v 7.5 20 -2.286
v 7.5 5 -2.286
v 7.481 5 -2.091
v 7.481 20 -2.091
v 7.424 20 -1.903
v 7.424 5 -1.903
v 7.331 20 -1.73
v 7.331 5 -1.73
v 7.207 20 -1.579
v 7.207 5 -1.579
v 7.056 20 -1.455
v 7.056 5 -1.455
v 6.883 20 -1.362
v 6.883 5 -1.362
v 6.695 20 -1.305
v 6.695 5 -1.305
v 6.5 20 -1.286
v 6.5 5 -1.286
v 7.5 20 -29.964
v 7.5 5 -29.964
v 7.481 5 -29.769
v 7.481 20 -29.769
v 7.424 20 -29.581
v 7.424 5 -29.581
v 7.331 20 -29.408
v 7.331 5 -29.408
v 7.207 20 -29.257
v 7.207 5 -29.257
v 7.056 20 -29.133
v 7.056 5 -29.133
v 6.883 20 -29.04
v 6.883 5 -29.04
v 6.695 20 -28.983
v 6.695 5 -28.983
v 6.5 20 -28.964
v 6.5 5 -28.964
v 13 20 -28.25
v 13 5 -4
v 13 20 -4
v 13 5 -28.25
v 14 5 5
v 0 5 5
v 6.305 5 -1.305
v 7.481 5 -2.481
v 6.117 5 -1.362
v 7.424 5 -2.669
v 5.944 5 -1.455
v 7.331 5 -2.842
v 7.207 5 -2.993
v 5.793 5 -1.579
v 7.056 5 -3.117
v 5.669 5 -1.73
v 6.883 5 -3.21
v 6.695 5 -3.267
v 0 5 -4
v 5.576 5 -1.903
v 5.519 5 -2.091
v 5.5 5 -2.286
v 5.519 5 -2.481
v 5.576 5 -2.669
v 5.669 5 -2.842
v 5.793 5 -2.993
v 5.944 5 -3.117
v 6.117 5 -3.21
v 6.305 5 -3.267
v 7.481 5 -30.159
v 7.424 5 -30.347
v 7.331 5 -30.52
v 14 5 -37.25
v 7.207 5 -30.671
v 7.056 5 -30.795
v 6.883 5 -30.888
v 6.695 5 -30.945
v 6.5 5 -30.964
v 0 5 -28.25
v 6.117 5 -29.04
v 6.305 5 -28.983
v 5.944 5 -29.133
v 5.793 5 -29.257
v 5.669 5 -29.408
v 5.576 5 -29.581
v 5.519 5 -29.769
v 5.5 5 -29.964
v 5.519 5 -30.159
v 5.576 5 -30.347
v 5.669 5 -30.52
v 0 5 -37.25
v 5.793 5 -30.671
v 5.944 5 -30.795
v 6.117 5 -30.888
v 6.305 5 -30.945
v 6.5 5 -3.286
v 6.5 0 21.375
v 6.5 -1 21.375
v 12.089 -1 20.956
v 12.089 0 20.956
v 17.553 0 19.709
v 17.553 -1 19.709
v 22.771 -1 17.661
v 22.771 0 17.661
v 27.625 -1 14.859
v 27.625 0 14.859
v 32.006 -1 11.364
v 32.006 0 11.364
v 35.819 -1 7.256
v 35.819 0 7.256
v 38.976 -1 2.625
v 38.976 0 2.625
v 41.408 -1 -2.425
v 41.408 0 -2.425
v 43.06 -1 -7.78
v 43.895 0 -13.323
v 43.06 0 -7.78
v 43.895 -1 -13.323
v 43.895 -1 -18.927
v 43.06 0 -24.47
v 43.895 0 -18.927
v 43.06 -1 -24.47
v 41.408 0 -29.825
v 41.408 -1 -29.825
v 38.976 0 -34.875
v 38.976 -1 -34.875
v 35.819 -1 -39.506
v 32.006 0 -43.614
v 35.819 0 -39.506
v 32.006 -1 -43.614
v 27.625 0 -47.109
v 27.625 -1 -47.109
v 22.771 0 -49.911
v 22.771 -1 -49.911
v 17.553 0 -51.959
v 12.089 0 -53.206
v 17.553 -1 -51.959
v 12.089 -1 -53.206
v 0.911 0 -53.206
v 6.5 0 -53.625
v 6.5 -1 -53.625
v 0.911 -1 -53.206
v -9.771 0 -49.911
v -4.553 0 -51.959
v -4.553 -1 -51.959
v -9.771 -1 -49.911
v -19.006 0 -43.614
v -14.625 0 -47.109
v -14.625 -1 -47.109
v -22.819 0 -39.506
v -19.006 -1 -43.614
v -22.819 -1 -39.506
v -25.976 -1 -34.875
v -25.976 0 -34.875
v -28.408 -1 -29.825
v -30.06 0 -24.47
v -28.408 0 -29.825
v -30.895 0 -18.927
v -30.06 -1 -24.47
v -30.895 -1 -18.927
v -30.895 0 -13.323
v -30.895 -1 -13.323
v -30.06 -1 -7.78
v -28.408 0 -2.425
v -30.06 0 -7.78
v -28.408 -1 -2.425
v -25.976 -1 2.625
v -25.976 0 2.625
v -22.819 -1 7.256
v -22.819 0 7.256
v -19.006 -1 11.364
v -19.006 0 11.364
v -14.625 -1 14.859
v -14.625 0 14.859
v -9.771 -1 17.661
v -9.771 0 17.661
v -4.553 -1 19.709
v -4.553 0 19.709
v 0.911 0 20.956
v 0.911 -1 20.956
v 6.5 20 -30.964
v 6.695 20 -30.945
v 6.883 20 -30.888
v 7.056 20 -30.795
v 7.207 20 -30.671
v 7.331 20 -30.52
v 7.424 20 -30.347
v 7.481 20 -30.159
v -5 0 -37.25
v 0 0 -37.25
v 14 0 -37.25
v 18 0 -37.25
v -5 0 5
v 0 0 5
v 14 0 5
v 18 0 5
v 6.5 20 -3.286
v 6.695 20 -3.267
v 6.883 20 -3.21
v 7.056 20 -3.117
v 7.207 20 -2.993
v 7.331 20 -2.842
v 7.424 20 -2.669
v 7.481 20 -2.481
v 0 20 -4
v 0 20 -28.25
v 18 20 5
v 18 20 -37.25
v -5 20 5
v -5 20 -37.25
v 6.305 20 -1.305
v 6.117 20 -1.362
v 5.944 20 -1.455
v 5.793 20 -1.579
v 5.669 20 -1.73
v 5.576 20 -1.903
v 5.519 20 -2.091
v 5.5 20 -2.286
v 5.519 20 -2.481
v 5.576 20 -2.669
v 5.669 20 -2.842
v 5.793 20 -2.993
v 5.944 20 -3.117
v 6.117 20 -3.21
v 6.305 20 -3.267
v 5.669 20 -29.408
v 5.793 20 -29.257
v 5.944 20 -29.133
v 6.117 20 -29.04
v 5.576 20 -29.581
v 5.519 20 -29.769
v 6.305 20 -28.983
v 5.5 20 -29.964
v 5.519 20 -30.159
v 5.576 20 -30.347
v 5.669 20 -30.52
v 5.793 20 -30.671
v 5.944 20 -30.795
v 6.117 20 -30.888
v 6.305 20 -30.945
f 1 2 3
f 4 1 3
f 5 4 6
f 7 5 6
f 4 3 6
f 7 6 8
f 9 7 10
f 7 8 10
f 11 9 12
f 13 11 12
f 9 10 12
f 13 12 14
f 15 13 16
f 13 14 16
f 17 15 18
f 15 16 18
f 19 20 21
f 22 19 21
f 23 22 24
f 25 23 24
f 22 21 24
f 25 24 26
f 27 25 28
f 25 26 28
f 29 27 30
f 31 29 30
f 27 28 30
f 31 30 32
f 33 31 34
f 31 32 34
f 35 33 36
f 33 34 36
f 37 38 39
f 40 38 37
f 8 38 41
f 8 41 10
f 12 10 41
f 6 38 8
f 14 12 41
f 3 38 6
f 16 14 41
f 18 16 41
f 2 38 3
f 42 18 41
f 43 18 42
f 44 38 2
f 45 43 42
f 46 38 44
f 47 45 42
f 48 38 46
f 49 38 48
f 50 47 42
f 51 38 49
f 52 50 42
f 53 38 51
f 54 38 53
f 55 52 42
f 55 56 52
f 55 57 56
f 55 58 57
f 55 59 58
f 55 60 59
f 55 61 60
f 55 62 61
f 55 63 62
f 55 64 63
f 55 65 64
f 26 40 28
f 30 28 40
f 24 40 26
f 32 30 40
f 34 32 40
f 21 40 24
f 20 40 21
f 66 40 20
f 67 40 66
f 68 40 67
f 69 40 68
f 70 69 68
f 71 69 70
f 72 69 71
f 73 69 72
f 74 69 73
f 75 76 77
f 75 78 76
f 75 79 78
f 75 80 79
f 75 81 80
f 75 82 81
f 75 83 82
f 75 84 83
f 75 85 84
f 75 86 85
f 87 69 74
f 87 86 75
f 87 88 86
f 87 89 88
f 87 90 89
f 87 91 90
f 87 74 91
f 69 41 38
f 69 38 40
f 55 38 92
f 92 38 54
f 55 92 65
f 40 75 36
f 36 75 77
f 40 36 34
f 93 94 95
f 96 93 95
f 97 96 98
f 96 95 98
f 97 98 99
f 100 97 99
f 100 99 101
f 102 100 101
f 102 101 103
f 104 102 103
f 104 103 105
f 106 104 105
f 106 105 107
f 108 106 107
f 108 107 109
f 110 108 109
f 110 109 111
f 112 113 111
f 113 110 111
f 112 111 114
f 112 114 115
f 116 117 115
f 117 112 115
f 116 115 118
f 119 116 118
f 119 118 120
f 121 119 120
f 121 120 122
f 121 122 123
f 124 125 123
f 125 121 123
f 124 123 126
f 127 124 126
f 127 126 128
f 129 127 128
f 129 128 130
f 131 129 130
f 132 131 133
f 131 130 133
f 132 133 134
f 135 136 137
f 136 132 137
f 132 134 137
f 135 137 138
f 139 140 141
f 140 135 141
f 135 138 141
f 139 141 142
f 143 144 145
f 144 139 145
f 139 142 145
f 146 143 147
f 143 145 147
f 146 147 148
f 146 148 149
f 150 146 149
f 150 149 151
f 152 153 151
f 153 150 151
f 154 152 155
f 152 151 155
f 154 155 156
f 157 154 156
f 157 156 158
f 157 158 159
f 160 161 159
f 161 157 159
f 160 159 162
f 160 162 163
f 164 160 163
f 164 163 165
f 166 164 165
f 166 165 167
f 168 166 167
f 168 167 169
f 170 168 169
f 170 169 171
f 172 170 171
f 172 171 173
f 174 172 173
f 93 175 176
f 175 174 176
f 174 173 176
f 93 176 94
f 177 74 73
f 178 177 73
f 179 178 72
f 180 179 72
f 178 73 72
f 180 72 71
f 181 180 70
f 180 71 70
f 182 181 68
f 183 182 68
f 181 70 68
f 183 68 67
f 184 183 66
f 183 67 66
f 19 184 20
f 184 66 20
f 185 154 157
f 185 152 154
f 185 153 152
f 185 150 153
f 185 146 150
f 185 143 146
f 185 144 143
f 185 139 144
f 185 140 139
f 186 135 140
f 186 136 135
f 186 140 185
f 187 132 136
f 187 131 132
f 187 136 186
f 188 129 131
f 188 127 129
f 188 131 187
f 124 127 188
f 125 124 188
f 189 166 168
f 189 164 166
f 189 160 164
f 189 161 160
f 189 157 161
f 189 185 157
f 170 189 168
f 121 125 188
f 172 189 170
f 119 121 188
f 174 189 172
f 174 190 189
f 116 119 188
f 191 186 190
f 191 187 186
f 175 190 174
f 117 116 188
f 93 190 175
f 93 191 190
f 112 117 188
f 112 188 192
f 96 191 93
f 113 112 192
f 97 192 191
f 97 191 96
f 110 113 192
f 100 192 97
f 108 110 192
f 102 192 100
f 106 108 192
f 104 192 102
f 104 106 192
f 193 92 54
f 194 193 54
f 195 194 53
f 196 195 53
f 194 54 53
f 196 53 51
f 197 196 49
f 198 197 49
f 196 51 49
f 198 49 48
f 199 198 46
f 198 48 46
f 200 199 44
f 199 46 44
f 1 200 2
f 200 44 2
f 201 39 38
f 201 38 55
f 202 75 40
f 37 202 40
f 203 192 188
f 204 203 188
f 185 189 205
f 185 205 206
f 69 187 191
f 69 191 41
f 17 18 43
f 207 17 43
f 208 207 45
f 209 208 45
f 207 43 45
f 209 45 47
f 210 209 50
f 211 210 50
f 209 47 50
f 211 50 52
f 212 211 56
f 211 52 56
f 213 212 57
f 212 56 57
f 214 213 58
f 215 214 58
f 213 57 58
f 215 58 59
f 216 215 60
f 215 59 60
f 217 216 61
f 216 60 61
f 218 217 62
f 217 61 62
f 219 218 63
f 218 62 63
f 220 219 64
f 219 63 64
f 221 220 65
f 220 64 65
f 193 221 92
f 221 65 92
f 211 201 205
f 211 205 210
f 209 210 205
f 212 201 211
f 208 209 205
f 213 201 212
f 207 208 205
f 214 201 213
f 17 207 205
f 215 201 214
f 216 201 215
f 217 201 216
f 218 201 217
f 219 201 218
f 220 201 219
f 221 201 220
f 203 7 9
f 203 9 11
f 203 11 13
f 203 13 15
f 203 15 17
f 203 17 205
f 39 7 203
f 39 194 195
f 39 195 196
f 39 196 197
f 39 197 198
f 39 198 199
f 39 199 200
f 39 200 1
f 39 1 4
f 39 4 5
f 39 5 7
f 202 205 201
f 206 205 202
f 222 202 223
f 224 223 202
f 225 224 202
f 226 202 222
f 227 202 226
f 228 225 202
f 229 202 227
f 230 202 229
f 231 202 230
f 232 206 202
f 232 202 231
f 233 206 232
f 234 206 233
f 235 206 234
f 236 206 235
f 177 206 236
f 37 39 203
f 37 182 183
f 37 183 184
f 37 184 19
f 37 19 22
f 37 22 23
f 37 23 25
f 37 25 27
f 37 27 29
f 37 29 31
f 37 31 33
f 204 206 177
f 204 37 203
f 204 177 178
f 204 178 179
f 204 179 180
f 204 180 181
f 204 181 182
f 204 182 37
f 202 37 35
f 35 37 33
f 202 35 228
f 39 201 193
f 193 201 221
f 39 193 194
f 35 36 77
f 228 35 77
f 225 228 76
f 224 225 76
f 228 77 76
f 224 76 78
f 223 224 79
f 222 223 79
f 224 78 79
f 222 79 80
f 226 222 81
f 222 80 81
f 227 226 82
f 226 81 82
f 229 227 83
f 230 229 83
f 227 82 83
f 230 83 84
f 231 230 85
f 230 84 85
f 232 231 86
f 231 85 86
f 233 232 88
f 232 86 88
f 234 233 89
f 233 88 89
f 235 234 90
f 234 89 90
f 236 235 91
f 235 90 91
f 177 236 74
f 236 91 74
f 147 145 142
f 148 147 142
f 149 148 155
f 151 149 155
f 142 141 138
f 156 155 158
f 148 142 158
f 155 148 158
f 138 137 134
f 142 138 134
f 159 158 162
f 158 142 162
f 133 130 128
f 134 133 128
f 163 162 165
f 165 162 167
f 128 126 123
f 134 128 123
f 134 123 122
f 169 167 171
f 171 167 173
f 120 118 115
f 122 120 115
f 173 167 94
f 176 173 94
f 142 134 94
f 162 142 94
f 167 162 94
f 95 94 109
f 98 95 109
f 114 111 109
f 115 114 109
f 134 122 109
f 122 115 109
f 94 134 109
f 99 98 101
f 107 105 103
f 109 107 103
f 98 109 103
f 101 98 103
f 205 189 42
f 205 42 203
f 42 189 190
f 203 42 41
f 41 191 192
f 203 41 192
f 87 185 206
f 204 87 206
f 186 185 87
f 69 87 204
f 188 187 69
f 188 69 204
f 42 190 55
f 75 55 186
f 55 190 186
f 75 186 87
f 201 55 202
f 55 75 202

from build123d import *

# Parameters (mm, degrees)
SKETCH2_W           = 23
SKETCH2_H           = 42.25
SKETCH2_W_2         = 13
SKETCH2_H_2         = 24.25
SKETCH2_R           = 1
BOSS_EXTRUDE1_DEPTH = 20
SKETCH2_3_R         = 37.5
BOSS_EXTRUDE2_DEPTH = 1
SKETCH4_W           = 14
SKETCH4_H           = 5
CUT_EXTRUDE1_DEPTH  = 168


with BuildPart() as part:
    # Sketch2 → Boss-Extrude1 (new body)
    with BuildSketch(Plane(origin=(0, 0, 0), x_dir=(1, 0, 0), z_dir=(0, 1, 0))):
        with Locations((6.5, 16.125)):
            Rectangle(SKETCH2_W, SKETCH2_H)
        with Locations((6.5, 16.125)):
            Rectangle(SKETCH2_W_2, SKETCH2_H_2, mode=Mode.SUBTRACT)
        with Locations((6.5, 2.286)):
            Circle(SKETCH2_R, mode=Mode.SUBTRACT)
        with Locations((6.5, 29.964)):
            Circle(SKETCH2_R, mode=Mode.SUBTRACT)
    extrude(amount=BOSS_EXTRUDE1_DEPTH)

    # Sketch2<3> → Boss-Extrude2 (add)
    with BuildSketch(Plane(origin=(0, 0, 0), x_dir=(1, 0, 0), z_dir=(0, 1, 0))):
        with Locations((6.5, 16.125)):
            Circle(SKETCH2_3_R)
    extrude(amount=-BOSS_EXTRUDE2_DEPTH)

    # Sketch4 → Cut-Extrude1 (cut)
    with BuildSketch(Plane(origin=(0, 0, -37.25), x_dir=(-1, 0, 0), z_dir=(0, 0, -1))):
        with Locations((-7, 2.5)):
            Rectangle(SKETCH4_W, SKETCH4_H)
    extrude(amount=-CUT_EXTRUDE1_DEPTH, mode=Mode.SUBTRACT)


solid = part.part
